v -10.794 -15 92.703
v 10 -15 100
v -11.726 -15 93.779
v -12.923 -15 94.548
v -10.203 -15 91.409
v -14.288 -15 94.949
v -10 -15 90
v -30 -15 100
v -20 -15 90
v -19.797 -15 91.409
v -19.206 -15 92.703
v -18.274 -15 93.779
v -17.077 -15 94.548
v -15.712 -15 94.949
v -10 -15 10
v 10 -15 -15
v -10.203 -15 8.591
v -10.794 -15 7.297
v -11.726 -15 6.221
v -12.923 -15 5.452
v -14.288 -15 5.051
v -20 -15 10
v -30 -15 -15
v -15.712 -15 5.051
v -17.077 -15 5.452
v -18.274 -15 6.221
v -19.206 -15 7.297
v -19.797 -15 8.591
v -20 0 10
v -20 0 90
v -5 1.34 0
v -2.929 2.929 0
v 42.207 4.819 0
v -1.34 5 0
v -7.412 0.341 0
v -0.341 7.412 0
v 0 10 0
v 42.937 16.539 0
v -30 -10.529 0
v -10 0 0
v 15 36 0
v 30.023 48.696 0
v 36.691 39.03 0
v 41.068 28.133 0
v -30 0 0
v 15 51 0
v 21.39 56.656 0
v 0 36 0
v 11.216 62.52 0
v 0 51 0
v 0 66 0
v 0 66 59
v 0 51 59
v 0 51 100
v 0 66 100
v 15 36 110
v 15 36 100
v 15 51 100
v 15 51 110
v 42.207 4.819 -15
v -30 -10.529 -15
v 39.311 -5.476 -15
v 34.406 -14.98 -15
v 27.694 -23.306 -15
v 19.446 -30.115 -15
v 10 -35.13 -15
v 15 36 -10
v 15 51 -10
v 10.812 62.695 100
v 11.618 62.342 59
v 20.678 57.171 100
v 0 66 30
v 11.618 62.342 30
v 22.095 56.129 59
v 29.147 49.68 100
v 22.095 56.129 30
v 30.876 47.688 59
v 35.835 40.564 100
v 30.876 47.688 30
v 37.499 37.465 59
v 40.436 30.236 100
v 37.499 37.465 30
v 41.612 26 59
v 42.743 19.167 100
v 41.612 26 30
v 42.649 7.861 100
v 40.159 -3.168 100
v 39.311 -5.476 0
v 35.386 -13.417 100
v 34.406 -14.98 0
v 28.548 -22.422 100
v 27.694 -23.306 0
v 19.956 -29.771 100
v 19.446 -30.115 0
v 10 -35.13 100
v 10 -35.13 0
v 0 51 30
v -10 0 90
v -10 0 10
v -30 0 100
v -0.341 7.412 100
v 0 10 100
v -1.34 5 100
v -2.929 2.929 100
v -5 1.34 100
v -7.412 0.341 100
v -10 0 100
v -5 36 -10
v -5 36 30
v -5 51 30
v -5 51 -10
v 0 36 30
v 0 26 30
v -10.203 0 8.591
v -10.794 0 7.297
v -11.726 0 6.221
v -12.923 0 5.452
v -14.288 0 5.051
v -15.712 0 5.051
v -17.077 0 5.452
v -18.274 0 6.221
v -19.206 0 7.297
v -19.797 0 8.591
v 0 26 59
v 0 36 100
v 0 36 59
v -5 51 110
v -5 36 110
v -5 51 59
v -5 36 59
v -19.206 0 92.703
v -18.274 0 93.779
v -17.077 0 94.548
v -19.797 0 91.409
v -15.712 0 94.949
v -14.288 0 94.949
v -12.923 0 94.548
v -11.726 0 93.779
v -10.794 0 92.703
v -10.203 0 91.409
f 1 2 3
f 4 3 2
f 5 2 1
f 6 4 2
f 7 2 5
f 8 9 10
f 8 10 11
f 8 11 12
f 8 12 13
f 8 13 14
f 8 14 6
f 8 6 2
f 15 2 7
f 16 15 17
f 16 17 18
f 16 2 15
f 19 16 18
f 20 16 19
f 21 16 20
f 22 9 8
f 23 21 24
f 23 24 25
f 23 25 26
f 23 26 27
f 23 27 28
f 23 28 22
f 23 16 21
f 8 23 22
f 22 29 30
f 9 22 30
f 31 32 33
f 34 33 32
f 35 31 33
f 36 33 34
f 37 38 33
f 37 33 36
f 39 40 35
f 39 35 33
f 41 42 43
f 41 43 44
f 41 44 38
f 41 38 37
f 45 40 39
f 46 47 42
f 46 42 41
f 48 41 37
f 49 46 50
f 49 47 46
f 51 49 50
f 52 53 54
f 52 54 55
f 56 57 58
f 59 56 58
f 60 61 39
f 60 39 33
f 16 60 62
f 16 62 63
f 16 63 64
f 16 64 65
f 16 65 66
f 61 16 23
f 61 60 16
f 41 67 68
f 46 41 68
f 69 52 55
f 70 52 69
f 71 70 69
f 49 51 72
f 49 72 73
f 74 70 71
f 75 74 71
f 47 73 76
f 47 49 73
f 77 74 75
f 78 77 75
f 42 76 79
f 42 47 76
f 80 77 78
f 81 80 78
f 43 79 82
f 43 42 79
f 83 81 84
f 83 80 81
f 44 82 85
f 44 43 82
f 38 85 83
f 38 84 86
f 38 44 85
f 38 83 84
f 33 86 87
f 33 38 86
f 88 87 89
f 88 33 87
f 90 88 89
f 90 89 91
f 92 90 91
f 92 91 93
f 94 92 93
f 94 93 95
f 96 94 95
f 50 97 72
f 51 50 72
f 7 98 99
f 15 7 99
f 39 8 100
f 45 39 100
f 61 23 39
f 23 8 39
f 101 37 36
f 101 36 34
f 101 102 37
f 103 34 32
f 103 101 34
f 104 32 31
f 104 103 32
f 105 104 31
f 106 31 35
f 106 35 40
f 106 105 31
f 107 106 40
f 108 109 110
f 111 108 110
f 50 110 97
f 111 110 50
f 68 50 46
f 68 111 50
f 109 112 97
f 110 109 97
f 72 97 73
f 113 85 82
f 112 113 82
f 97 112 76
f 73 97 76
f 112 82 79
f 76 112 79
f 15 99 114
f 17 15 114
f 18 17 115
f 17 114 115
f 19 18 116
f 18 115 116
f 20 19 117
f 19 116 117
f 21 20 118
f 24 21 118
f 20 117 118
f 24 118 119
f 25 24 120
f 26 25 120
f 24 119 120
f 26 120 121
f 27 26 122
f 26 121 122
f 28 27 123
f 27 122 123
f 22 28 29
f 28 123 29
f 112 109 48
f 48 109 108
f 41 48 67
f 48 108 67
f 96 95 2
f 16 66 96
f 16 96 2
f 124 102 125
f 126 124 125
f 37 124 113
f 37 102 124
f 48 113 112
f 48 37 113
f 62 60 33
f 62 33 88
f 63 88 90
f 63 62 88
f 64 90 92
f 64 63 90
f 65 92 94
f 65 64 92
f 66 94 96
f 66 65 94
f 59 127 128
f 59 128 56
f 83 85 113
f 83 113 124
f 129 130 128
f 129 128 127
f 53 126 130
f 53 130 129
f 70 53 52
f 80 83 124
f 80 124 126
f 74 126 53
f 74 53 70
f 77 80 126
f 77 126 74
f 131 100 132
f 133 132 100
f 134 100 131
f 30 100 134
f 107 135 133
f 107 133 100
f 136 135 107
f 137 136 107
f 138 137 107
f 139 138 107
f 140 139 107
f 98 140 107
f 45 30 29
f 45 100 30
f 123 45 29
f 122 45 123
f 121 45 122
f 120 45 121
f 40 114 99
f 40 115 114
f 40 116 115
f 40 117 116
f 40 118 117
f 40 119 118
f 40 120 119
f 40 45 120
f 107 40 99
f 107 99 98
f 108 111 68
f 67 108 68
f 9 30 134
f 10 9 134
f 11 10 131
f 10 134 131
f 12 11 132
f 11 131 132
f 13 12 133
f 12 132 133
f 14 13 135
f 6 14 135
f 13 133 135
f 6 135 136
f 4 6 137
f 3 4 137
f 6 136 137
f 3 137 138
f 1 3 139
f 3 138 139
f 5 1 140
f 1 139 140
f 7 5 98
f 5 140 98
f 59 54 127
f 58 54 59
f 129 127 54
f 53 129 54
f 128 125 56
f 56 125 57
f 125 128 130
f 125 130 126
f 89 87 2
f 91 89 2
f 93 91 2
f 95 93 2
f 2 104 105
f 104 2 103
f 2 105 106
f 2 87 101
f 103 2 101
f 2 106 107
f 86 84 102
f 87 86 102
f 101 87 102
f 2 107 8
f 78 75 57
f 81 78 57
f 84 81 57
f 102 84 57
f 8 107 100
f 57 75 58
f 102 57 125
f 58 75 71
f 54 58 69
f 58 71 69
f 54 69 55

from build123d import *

# Parameters (mm, degrees)
BOSS_EXTRUDE1_DEPTH            = 100
BOSS_EXTRUDE2_START            = 15
BOSS_EXTRUDE2_DEPTH            = 15
CUT_EXTRUDE1_REACH             = 129.299
CUT_EXTRUDE1_DIRECTION_2_DEPTH = 128.298860953
BOSS_EXTRUDE3_DEPTH            = 10
BOSS_EXTRUDE3_DEPTH_BACK       = 110
SKETCH5_W                      = 20
SKETCH5_H                      = 15
CUT_EXTRUDE2_DEPTH             = 136.295971854
CUT_EXTRUDE2_DEPTH_BACK        = 136.295971854
SKETCH6_W                      = 29
SKETCH6_H                      = 40
FILLET1_R                      = 10


with BuildPart() as part:
    # Sketch1 → Boss-Extrude1 (new body)
    with BuildSketch(Plane.XY):
        with BuildLine():
            Line((10, -35.129619486), (10, -15))
            Line((10, -15), (-30, -15))
            Line((-30, -15), (-30, 0))
            Line((-30, 0), (0, 0))
            Line((0, 0), (0, 66))
            ThreePointArc((0, 66), (42.742771868, 19.167308707), (10, -35.129619486))
        make_face()
    extrude(amount=BOSS_EXTRUDE1_DEPTH)

    # Sketch2 → Boss-Extrude2 (add)
    with BuildSketch(Plane(origin=(0, 0, 0), x_dir=(-1, 0, 0), z_dir=(0, 0, -1)).offset(BOSS_EXTRUDE2_START)):
        with BuildLine():
            Line((30, -15), (30, -10.52909236))
            Line((30, -10.52909236), (-42.207179875, 4.819017522))
            ThreePointArc((-42.207179875, 4.819017522), (-31.260666573, -19.313012165), (-10, -35.129619486))
            Line((-10, -35.129619486), (-10, -15))
            Line((-10, -15), (30, -15))
        make_face()
    extrude(amount=-BOSS_EXTRUDE2_DEPTH)

    # Sketch4 → Cut-Extrude1 (cut, up to next)
    with BuildSketch(Plane(origin=(0, 0, 0), x_dir=(1, 0, 0), z_dir=(0, 1, 0)), mode=Mode.PRIVATE) as cut_extrude1_sk1:
        with BuildLine():
            Line((-20, -10), (-20, -90))
            ThreePointArc((-20, -90), (-15, -95), (-10, -90))
            Line((-10, -90), (-10, -10))
            ThreePointArc((-10, -10), (-15, -5), (-20, -10))
        make_face()
    cut_extrude1_tool1 = extrude(cut_extrude1_sk1.sketch, amount=-CUT_EXTRUDE1_REACH, mode=Mode.PRIVATE) & part.part
    add(cut_extrude1_tool1.solids().sort_by_distance((-15, 0, 50))[0], mode=Mode.SUBTRACT)

    # Sketch4 → Cut-Extrude1 direction 2 (cut)
    with BuildSketch(Plane(origin=(0, 0, 0), x_dir=(1, 0, 0), z_dir=(0, 1, 0))):
        with BuildLine():
            Line((-20, -10), (-20, -90))
            ThreePointArc((-20, -90), (-15, -95), (-10, -90))
            Line((-10, -90), (-10, -10))
            ThreePointArc((-10, -10), (-15, -5), (-20, -10))
        make_face()
    extrude(amount=CUT_EXTRUDE1_DIRECTION_2_DEPTH, mode=Mode.SUBTRACT)

    # Sketch5 → Boss-Extrude3 (add, two sides: drawn at the far end of the back side and taken through both)
    with BuildSketch(Plane.XY.offset(100).offset(-BOSS_EXTRUDE3_DEPTH_BACK)):
        with Locations((5, 43.5)):
            Rectangle(SKETCH5_W, SKETCH5_H)
    extrude(amount=BOSS_EXTRUDE3_DEPTH + BOSS_EXTRUDE3_DEPTH_BACK)

    # Sketch6 → Cut-Extrude2 (cut, two sides: drawn at the far end of the back side and taken through both)
    with BuildSketch(Plane.ZY.offset(-CUT_EXTRUDE2_DEPTH_BACK)):
        with Locations((44.5, 46)):
            Rectangle(SKETCH6_W, SKETCH6_H)
    extrude(amount=CUT_EXTRUDE2_DEPTH + CUT_EXTRUDE2_DEPTH_BACK, mode=Mode.SUBTRACT)

    # Fillet1
    fillet1_edges = [part.edges().sort_by_distance(p)[0] for p in [
        (0, 0, 50),
    ]]
    fillet(fillet1_edges, radius=FILLET1_R - 0.0001)  # a hair under: the kernel refuses the full size


solid = part.part
